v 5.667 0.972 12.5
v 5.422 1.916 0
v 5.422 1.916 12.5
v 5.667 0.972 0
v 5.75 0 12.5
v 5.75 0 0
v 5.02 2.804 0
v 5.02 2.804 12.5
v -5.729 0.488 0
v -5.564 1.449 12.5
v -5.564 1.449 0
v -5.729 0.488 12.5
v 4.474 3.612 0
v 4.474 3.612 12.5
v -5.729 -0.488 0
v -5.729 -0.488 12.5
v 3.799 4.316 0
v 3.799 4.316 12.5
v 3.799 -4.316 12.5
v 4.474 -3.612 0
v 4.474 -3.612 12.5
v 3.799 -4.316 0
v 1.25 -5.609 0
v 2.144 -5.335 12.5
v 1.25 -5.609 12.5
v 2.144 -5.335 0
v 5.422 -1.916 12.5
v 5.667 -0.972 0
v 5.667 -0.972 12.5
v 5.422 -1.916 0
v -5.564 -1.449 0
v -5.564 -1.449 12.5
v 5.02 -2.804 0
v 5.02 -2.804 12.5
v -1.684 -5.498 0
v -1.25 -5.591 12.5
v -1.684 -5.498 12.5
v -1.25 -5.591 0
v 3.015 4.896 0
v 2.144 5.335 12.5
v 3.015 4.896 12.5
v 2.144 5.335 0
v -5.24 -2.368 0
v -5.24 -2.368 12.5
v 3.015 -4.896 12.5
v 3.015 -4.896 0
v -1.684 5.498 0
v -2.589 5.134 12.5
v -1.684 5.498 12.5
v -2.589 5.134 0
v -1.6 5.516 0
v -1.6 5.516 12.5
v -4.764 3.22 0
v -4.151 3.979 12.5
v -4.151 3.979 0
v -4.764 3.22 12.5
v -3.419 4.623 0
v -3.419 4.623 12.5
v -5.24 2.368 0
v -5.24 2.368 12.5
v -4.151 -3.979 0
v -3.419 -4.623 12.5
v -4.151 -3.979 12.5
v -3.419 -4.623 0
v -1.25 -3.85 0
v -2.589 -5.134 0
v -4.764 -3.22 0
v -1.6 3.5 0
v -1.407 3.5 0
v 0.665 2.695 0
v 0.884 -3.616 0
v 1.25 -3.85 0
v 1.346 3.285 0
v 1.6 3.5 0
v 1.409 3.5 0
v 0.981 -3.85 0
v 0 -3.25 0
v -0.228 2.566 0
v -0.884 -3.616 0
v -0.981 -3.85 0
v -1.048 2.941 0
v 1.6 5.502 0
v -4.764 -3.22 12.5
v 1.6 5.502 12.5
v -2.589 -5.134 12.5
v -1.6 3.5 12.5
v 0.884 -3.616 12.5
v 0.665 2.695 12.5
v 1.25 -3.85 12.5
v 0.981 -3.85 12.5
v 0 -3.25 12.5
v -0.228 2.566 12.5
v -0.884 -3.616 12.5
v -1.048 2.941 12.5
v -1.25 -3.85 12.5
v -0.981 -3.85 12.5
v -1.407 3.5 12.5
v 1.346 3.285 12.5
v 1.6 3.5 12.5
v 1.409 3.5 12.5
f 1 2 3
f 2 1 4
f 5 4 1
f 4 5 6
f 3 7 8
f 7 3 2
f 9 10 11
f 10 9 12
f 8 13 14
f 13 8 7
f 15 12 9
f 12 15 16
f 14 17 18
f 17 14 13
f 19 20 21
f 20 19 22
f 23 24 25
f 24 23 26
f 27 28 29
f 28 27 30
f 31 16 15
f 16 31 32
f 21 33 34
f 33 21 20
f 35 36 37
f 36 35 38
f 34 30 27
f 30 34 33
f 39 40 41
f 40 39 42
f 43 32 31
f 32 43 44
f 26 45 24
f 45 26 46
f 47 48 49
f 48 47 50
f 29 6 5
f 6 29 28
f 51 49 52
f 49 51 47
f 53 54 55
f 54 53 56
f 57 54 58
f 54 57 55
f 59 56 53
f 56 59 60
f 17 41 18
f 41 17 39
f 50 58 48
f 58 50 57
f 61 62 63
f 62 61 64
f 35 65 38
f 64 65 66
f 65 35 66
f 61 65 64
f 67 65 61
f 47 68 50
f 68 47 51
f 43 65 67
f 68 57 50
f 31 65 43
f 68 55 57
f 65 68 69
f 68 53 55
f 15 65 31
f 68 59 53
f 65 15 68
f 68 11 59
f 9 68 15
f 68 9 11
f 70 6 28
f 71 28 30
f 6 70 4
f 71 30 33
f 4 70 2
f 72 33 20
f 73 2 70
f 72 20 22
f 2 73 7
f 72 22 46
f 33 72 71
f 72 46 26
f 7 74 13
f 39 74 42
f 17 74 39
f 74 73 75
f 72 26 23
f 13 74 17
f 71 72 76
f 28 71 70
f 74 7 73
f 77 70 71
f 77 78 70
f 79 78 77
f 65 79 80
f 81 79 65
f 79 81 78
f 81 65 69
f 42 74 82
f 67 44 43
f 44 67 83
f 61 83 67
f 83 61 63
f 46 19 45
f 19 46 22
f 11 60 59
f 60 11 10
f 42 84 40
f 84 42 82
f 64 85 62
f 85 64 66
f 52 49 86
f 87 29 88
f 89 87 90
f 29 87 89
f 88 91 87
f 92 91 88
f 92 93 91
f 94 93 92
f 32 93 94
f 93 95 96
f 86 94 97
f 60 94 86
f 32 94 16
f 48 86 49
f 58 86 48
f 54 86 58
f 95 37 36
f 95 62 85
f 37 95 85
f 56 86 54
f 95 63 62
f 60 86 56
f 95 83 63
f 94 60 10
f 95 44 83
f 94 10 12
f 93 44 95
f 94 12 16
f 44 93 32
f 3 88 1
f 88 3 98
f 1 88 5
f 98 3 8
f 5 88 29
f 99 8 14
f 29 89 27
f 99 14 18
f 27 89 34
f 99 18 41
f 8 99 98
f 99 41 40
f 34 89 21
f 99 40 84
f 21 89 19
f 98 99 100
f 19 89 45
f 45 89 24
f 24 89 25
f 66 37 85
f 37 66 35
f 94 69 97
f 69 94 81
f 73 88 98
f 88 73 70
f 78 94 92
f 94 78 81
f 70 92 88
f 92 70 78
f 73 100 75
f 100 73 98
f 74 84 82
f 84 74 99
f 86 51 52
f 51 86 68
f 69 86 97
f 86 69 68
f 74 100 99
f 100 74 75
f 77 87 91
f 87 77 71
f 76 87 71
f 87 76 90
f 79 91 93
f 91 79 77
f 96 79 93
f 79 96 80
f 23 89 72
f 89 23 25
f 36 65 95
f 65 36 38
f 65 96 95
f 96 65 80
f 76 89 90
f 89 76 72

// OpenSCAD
// all measurements are in millimeters
//These are specified diameters. No attempt to compensate for shrinkage.

Cylinder_diameter = 11.5;
Cylinder_hight = 12.5;

//Cylinder_offset = Box_width/3;
//Cutoff_hight = 32;

difference(){
 
translate([0,0,0])
cylinder(d = Cylinder_diameter, h = Cylinder_hight, $fs = 1,$fa  = 1); 
 
translate([0,(Cylinder_diameter-3.2)/2,0])
cylinder(d = 3.2, h = Cylinder_hight, $fs = 1,$fa  = 1); 
translate([0,(1.7+Cylinder_diameter-3.2)/2,Cylinder_hight/2])
cube([3.2,3,Cylinder_hight],true); 
  
translate([0,-(Cylinder_diameter-2.5)/2,0])
cylinder(d = 2.5, h = Cylinder_hight, $fs = 1,$fa  = 1);   
    
translate([0,-(1.7+Cylinder_diameter-2.5)/2,Cylinder_hight/2])
cube([2.5,3,Cylinder_hight],true); 
    
}
    
